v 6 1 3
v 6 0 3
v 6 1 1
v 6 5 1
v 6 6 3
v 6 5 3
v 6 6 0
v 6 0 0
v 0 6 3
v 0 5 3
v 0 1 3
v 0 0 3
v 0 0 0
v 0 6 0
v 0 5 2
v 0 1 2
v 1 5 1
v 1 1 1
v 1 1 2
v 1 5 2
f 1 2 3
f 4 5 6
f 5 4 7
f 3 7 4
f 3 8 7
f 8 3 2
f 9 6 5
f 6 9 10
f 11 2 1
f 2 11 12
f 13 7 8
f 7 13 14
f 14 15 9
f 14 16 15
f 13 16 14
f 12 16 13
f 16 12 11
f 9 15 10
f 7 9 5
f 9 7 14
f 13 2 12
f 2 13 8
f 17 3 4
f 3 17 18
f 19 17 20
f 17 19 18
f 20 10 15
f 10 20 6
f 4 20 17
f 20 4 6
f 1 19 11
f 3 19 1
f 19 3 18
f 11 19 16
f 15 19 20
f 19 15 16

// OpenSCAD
// file: defs.scad
w=210;
t1=10;
t3=20;
t=5;
a1=92.5;
a2=79.9;
a3=64.9;
b1=a1/2;
b2=a2;
b3=2*a3;
cds2=6;
cdst1=1;
cdst2=2;
cdst3=3;
// main file
include <defs.scad>

difference() {
cube([cds2,cds2,cdst3]);
translate([cdst1,cdst1,cdst1]) cube([cds2-2*cdst1,cds2-2*cdst1,cdst3-cdst1]);
translate([0, cdst1, cdst3-cdst1]) cube([cds2-2*cdst1, cds2-2*cdst1, cdst1]);
translate([cds2-cdst1,cdst1, cdst1]) cube([cdst1,cds2-2*cdst1,cdst3-cdst1]); 
}
